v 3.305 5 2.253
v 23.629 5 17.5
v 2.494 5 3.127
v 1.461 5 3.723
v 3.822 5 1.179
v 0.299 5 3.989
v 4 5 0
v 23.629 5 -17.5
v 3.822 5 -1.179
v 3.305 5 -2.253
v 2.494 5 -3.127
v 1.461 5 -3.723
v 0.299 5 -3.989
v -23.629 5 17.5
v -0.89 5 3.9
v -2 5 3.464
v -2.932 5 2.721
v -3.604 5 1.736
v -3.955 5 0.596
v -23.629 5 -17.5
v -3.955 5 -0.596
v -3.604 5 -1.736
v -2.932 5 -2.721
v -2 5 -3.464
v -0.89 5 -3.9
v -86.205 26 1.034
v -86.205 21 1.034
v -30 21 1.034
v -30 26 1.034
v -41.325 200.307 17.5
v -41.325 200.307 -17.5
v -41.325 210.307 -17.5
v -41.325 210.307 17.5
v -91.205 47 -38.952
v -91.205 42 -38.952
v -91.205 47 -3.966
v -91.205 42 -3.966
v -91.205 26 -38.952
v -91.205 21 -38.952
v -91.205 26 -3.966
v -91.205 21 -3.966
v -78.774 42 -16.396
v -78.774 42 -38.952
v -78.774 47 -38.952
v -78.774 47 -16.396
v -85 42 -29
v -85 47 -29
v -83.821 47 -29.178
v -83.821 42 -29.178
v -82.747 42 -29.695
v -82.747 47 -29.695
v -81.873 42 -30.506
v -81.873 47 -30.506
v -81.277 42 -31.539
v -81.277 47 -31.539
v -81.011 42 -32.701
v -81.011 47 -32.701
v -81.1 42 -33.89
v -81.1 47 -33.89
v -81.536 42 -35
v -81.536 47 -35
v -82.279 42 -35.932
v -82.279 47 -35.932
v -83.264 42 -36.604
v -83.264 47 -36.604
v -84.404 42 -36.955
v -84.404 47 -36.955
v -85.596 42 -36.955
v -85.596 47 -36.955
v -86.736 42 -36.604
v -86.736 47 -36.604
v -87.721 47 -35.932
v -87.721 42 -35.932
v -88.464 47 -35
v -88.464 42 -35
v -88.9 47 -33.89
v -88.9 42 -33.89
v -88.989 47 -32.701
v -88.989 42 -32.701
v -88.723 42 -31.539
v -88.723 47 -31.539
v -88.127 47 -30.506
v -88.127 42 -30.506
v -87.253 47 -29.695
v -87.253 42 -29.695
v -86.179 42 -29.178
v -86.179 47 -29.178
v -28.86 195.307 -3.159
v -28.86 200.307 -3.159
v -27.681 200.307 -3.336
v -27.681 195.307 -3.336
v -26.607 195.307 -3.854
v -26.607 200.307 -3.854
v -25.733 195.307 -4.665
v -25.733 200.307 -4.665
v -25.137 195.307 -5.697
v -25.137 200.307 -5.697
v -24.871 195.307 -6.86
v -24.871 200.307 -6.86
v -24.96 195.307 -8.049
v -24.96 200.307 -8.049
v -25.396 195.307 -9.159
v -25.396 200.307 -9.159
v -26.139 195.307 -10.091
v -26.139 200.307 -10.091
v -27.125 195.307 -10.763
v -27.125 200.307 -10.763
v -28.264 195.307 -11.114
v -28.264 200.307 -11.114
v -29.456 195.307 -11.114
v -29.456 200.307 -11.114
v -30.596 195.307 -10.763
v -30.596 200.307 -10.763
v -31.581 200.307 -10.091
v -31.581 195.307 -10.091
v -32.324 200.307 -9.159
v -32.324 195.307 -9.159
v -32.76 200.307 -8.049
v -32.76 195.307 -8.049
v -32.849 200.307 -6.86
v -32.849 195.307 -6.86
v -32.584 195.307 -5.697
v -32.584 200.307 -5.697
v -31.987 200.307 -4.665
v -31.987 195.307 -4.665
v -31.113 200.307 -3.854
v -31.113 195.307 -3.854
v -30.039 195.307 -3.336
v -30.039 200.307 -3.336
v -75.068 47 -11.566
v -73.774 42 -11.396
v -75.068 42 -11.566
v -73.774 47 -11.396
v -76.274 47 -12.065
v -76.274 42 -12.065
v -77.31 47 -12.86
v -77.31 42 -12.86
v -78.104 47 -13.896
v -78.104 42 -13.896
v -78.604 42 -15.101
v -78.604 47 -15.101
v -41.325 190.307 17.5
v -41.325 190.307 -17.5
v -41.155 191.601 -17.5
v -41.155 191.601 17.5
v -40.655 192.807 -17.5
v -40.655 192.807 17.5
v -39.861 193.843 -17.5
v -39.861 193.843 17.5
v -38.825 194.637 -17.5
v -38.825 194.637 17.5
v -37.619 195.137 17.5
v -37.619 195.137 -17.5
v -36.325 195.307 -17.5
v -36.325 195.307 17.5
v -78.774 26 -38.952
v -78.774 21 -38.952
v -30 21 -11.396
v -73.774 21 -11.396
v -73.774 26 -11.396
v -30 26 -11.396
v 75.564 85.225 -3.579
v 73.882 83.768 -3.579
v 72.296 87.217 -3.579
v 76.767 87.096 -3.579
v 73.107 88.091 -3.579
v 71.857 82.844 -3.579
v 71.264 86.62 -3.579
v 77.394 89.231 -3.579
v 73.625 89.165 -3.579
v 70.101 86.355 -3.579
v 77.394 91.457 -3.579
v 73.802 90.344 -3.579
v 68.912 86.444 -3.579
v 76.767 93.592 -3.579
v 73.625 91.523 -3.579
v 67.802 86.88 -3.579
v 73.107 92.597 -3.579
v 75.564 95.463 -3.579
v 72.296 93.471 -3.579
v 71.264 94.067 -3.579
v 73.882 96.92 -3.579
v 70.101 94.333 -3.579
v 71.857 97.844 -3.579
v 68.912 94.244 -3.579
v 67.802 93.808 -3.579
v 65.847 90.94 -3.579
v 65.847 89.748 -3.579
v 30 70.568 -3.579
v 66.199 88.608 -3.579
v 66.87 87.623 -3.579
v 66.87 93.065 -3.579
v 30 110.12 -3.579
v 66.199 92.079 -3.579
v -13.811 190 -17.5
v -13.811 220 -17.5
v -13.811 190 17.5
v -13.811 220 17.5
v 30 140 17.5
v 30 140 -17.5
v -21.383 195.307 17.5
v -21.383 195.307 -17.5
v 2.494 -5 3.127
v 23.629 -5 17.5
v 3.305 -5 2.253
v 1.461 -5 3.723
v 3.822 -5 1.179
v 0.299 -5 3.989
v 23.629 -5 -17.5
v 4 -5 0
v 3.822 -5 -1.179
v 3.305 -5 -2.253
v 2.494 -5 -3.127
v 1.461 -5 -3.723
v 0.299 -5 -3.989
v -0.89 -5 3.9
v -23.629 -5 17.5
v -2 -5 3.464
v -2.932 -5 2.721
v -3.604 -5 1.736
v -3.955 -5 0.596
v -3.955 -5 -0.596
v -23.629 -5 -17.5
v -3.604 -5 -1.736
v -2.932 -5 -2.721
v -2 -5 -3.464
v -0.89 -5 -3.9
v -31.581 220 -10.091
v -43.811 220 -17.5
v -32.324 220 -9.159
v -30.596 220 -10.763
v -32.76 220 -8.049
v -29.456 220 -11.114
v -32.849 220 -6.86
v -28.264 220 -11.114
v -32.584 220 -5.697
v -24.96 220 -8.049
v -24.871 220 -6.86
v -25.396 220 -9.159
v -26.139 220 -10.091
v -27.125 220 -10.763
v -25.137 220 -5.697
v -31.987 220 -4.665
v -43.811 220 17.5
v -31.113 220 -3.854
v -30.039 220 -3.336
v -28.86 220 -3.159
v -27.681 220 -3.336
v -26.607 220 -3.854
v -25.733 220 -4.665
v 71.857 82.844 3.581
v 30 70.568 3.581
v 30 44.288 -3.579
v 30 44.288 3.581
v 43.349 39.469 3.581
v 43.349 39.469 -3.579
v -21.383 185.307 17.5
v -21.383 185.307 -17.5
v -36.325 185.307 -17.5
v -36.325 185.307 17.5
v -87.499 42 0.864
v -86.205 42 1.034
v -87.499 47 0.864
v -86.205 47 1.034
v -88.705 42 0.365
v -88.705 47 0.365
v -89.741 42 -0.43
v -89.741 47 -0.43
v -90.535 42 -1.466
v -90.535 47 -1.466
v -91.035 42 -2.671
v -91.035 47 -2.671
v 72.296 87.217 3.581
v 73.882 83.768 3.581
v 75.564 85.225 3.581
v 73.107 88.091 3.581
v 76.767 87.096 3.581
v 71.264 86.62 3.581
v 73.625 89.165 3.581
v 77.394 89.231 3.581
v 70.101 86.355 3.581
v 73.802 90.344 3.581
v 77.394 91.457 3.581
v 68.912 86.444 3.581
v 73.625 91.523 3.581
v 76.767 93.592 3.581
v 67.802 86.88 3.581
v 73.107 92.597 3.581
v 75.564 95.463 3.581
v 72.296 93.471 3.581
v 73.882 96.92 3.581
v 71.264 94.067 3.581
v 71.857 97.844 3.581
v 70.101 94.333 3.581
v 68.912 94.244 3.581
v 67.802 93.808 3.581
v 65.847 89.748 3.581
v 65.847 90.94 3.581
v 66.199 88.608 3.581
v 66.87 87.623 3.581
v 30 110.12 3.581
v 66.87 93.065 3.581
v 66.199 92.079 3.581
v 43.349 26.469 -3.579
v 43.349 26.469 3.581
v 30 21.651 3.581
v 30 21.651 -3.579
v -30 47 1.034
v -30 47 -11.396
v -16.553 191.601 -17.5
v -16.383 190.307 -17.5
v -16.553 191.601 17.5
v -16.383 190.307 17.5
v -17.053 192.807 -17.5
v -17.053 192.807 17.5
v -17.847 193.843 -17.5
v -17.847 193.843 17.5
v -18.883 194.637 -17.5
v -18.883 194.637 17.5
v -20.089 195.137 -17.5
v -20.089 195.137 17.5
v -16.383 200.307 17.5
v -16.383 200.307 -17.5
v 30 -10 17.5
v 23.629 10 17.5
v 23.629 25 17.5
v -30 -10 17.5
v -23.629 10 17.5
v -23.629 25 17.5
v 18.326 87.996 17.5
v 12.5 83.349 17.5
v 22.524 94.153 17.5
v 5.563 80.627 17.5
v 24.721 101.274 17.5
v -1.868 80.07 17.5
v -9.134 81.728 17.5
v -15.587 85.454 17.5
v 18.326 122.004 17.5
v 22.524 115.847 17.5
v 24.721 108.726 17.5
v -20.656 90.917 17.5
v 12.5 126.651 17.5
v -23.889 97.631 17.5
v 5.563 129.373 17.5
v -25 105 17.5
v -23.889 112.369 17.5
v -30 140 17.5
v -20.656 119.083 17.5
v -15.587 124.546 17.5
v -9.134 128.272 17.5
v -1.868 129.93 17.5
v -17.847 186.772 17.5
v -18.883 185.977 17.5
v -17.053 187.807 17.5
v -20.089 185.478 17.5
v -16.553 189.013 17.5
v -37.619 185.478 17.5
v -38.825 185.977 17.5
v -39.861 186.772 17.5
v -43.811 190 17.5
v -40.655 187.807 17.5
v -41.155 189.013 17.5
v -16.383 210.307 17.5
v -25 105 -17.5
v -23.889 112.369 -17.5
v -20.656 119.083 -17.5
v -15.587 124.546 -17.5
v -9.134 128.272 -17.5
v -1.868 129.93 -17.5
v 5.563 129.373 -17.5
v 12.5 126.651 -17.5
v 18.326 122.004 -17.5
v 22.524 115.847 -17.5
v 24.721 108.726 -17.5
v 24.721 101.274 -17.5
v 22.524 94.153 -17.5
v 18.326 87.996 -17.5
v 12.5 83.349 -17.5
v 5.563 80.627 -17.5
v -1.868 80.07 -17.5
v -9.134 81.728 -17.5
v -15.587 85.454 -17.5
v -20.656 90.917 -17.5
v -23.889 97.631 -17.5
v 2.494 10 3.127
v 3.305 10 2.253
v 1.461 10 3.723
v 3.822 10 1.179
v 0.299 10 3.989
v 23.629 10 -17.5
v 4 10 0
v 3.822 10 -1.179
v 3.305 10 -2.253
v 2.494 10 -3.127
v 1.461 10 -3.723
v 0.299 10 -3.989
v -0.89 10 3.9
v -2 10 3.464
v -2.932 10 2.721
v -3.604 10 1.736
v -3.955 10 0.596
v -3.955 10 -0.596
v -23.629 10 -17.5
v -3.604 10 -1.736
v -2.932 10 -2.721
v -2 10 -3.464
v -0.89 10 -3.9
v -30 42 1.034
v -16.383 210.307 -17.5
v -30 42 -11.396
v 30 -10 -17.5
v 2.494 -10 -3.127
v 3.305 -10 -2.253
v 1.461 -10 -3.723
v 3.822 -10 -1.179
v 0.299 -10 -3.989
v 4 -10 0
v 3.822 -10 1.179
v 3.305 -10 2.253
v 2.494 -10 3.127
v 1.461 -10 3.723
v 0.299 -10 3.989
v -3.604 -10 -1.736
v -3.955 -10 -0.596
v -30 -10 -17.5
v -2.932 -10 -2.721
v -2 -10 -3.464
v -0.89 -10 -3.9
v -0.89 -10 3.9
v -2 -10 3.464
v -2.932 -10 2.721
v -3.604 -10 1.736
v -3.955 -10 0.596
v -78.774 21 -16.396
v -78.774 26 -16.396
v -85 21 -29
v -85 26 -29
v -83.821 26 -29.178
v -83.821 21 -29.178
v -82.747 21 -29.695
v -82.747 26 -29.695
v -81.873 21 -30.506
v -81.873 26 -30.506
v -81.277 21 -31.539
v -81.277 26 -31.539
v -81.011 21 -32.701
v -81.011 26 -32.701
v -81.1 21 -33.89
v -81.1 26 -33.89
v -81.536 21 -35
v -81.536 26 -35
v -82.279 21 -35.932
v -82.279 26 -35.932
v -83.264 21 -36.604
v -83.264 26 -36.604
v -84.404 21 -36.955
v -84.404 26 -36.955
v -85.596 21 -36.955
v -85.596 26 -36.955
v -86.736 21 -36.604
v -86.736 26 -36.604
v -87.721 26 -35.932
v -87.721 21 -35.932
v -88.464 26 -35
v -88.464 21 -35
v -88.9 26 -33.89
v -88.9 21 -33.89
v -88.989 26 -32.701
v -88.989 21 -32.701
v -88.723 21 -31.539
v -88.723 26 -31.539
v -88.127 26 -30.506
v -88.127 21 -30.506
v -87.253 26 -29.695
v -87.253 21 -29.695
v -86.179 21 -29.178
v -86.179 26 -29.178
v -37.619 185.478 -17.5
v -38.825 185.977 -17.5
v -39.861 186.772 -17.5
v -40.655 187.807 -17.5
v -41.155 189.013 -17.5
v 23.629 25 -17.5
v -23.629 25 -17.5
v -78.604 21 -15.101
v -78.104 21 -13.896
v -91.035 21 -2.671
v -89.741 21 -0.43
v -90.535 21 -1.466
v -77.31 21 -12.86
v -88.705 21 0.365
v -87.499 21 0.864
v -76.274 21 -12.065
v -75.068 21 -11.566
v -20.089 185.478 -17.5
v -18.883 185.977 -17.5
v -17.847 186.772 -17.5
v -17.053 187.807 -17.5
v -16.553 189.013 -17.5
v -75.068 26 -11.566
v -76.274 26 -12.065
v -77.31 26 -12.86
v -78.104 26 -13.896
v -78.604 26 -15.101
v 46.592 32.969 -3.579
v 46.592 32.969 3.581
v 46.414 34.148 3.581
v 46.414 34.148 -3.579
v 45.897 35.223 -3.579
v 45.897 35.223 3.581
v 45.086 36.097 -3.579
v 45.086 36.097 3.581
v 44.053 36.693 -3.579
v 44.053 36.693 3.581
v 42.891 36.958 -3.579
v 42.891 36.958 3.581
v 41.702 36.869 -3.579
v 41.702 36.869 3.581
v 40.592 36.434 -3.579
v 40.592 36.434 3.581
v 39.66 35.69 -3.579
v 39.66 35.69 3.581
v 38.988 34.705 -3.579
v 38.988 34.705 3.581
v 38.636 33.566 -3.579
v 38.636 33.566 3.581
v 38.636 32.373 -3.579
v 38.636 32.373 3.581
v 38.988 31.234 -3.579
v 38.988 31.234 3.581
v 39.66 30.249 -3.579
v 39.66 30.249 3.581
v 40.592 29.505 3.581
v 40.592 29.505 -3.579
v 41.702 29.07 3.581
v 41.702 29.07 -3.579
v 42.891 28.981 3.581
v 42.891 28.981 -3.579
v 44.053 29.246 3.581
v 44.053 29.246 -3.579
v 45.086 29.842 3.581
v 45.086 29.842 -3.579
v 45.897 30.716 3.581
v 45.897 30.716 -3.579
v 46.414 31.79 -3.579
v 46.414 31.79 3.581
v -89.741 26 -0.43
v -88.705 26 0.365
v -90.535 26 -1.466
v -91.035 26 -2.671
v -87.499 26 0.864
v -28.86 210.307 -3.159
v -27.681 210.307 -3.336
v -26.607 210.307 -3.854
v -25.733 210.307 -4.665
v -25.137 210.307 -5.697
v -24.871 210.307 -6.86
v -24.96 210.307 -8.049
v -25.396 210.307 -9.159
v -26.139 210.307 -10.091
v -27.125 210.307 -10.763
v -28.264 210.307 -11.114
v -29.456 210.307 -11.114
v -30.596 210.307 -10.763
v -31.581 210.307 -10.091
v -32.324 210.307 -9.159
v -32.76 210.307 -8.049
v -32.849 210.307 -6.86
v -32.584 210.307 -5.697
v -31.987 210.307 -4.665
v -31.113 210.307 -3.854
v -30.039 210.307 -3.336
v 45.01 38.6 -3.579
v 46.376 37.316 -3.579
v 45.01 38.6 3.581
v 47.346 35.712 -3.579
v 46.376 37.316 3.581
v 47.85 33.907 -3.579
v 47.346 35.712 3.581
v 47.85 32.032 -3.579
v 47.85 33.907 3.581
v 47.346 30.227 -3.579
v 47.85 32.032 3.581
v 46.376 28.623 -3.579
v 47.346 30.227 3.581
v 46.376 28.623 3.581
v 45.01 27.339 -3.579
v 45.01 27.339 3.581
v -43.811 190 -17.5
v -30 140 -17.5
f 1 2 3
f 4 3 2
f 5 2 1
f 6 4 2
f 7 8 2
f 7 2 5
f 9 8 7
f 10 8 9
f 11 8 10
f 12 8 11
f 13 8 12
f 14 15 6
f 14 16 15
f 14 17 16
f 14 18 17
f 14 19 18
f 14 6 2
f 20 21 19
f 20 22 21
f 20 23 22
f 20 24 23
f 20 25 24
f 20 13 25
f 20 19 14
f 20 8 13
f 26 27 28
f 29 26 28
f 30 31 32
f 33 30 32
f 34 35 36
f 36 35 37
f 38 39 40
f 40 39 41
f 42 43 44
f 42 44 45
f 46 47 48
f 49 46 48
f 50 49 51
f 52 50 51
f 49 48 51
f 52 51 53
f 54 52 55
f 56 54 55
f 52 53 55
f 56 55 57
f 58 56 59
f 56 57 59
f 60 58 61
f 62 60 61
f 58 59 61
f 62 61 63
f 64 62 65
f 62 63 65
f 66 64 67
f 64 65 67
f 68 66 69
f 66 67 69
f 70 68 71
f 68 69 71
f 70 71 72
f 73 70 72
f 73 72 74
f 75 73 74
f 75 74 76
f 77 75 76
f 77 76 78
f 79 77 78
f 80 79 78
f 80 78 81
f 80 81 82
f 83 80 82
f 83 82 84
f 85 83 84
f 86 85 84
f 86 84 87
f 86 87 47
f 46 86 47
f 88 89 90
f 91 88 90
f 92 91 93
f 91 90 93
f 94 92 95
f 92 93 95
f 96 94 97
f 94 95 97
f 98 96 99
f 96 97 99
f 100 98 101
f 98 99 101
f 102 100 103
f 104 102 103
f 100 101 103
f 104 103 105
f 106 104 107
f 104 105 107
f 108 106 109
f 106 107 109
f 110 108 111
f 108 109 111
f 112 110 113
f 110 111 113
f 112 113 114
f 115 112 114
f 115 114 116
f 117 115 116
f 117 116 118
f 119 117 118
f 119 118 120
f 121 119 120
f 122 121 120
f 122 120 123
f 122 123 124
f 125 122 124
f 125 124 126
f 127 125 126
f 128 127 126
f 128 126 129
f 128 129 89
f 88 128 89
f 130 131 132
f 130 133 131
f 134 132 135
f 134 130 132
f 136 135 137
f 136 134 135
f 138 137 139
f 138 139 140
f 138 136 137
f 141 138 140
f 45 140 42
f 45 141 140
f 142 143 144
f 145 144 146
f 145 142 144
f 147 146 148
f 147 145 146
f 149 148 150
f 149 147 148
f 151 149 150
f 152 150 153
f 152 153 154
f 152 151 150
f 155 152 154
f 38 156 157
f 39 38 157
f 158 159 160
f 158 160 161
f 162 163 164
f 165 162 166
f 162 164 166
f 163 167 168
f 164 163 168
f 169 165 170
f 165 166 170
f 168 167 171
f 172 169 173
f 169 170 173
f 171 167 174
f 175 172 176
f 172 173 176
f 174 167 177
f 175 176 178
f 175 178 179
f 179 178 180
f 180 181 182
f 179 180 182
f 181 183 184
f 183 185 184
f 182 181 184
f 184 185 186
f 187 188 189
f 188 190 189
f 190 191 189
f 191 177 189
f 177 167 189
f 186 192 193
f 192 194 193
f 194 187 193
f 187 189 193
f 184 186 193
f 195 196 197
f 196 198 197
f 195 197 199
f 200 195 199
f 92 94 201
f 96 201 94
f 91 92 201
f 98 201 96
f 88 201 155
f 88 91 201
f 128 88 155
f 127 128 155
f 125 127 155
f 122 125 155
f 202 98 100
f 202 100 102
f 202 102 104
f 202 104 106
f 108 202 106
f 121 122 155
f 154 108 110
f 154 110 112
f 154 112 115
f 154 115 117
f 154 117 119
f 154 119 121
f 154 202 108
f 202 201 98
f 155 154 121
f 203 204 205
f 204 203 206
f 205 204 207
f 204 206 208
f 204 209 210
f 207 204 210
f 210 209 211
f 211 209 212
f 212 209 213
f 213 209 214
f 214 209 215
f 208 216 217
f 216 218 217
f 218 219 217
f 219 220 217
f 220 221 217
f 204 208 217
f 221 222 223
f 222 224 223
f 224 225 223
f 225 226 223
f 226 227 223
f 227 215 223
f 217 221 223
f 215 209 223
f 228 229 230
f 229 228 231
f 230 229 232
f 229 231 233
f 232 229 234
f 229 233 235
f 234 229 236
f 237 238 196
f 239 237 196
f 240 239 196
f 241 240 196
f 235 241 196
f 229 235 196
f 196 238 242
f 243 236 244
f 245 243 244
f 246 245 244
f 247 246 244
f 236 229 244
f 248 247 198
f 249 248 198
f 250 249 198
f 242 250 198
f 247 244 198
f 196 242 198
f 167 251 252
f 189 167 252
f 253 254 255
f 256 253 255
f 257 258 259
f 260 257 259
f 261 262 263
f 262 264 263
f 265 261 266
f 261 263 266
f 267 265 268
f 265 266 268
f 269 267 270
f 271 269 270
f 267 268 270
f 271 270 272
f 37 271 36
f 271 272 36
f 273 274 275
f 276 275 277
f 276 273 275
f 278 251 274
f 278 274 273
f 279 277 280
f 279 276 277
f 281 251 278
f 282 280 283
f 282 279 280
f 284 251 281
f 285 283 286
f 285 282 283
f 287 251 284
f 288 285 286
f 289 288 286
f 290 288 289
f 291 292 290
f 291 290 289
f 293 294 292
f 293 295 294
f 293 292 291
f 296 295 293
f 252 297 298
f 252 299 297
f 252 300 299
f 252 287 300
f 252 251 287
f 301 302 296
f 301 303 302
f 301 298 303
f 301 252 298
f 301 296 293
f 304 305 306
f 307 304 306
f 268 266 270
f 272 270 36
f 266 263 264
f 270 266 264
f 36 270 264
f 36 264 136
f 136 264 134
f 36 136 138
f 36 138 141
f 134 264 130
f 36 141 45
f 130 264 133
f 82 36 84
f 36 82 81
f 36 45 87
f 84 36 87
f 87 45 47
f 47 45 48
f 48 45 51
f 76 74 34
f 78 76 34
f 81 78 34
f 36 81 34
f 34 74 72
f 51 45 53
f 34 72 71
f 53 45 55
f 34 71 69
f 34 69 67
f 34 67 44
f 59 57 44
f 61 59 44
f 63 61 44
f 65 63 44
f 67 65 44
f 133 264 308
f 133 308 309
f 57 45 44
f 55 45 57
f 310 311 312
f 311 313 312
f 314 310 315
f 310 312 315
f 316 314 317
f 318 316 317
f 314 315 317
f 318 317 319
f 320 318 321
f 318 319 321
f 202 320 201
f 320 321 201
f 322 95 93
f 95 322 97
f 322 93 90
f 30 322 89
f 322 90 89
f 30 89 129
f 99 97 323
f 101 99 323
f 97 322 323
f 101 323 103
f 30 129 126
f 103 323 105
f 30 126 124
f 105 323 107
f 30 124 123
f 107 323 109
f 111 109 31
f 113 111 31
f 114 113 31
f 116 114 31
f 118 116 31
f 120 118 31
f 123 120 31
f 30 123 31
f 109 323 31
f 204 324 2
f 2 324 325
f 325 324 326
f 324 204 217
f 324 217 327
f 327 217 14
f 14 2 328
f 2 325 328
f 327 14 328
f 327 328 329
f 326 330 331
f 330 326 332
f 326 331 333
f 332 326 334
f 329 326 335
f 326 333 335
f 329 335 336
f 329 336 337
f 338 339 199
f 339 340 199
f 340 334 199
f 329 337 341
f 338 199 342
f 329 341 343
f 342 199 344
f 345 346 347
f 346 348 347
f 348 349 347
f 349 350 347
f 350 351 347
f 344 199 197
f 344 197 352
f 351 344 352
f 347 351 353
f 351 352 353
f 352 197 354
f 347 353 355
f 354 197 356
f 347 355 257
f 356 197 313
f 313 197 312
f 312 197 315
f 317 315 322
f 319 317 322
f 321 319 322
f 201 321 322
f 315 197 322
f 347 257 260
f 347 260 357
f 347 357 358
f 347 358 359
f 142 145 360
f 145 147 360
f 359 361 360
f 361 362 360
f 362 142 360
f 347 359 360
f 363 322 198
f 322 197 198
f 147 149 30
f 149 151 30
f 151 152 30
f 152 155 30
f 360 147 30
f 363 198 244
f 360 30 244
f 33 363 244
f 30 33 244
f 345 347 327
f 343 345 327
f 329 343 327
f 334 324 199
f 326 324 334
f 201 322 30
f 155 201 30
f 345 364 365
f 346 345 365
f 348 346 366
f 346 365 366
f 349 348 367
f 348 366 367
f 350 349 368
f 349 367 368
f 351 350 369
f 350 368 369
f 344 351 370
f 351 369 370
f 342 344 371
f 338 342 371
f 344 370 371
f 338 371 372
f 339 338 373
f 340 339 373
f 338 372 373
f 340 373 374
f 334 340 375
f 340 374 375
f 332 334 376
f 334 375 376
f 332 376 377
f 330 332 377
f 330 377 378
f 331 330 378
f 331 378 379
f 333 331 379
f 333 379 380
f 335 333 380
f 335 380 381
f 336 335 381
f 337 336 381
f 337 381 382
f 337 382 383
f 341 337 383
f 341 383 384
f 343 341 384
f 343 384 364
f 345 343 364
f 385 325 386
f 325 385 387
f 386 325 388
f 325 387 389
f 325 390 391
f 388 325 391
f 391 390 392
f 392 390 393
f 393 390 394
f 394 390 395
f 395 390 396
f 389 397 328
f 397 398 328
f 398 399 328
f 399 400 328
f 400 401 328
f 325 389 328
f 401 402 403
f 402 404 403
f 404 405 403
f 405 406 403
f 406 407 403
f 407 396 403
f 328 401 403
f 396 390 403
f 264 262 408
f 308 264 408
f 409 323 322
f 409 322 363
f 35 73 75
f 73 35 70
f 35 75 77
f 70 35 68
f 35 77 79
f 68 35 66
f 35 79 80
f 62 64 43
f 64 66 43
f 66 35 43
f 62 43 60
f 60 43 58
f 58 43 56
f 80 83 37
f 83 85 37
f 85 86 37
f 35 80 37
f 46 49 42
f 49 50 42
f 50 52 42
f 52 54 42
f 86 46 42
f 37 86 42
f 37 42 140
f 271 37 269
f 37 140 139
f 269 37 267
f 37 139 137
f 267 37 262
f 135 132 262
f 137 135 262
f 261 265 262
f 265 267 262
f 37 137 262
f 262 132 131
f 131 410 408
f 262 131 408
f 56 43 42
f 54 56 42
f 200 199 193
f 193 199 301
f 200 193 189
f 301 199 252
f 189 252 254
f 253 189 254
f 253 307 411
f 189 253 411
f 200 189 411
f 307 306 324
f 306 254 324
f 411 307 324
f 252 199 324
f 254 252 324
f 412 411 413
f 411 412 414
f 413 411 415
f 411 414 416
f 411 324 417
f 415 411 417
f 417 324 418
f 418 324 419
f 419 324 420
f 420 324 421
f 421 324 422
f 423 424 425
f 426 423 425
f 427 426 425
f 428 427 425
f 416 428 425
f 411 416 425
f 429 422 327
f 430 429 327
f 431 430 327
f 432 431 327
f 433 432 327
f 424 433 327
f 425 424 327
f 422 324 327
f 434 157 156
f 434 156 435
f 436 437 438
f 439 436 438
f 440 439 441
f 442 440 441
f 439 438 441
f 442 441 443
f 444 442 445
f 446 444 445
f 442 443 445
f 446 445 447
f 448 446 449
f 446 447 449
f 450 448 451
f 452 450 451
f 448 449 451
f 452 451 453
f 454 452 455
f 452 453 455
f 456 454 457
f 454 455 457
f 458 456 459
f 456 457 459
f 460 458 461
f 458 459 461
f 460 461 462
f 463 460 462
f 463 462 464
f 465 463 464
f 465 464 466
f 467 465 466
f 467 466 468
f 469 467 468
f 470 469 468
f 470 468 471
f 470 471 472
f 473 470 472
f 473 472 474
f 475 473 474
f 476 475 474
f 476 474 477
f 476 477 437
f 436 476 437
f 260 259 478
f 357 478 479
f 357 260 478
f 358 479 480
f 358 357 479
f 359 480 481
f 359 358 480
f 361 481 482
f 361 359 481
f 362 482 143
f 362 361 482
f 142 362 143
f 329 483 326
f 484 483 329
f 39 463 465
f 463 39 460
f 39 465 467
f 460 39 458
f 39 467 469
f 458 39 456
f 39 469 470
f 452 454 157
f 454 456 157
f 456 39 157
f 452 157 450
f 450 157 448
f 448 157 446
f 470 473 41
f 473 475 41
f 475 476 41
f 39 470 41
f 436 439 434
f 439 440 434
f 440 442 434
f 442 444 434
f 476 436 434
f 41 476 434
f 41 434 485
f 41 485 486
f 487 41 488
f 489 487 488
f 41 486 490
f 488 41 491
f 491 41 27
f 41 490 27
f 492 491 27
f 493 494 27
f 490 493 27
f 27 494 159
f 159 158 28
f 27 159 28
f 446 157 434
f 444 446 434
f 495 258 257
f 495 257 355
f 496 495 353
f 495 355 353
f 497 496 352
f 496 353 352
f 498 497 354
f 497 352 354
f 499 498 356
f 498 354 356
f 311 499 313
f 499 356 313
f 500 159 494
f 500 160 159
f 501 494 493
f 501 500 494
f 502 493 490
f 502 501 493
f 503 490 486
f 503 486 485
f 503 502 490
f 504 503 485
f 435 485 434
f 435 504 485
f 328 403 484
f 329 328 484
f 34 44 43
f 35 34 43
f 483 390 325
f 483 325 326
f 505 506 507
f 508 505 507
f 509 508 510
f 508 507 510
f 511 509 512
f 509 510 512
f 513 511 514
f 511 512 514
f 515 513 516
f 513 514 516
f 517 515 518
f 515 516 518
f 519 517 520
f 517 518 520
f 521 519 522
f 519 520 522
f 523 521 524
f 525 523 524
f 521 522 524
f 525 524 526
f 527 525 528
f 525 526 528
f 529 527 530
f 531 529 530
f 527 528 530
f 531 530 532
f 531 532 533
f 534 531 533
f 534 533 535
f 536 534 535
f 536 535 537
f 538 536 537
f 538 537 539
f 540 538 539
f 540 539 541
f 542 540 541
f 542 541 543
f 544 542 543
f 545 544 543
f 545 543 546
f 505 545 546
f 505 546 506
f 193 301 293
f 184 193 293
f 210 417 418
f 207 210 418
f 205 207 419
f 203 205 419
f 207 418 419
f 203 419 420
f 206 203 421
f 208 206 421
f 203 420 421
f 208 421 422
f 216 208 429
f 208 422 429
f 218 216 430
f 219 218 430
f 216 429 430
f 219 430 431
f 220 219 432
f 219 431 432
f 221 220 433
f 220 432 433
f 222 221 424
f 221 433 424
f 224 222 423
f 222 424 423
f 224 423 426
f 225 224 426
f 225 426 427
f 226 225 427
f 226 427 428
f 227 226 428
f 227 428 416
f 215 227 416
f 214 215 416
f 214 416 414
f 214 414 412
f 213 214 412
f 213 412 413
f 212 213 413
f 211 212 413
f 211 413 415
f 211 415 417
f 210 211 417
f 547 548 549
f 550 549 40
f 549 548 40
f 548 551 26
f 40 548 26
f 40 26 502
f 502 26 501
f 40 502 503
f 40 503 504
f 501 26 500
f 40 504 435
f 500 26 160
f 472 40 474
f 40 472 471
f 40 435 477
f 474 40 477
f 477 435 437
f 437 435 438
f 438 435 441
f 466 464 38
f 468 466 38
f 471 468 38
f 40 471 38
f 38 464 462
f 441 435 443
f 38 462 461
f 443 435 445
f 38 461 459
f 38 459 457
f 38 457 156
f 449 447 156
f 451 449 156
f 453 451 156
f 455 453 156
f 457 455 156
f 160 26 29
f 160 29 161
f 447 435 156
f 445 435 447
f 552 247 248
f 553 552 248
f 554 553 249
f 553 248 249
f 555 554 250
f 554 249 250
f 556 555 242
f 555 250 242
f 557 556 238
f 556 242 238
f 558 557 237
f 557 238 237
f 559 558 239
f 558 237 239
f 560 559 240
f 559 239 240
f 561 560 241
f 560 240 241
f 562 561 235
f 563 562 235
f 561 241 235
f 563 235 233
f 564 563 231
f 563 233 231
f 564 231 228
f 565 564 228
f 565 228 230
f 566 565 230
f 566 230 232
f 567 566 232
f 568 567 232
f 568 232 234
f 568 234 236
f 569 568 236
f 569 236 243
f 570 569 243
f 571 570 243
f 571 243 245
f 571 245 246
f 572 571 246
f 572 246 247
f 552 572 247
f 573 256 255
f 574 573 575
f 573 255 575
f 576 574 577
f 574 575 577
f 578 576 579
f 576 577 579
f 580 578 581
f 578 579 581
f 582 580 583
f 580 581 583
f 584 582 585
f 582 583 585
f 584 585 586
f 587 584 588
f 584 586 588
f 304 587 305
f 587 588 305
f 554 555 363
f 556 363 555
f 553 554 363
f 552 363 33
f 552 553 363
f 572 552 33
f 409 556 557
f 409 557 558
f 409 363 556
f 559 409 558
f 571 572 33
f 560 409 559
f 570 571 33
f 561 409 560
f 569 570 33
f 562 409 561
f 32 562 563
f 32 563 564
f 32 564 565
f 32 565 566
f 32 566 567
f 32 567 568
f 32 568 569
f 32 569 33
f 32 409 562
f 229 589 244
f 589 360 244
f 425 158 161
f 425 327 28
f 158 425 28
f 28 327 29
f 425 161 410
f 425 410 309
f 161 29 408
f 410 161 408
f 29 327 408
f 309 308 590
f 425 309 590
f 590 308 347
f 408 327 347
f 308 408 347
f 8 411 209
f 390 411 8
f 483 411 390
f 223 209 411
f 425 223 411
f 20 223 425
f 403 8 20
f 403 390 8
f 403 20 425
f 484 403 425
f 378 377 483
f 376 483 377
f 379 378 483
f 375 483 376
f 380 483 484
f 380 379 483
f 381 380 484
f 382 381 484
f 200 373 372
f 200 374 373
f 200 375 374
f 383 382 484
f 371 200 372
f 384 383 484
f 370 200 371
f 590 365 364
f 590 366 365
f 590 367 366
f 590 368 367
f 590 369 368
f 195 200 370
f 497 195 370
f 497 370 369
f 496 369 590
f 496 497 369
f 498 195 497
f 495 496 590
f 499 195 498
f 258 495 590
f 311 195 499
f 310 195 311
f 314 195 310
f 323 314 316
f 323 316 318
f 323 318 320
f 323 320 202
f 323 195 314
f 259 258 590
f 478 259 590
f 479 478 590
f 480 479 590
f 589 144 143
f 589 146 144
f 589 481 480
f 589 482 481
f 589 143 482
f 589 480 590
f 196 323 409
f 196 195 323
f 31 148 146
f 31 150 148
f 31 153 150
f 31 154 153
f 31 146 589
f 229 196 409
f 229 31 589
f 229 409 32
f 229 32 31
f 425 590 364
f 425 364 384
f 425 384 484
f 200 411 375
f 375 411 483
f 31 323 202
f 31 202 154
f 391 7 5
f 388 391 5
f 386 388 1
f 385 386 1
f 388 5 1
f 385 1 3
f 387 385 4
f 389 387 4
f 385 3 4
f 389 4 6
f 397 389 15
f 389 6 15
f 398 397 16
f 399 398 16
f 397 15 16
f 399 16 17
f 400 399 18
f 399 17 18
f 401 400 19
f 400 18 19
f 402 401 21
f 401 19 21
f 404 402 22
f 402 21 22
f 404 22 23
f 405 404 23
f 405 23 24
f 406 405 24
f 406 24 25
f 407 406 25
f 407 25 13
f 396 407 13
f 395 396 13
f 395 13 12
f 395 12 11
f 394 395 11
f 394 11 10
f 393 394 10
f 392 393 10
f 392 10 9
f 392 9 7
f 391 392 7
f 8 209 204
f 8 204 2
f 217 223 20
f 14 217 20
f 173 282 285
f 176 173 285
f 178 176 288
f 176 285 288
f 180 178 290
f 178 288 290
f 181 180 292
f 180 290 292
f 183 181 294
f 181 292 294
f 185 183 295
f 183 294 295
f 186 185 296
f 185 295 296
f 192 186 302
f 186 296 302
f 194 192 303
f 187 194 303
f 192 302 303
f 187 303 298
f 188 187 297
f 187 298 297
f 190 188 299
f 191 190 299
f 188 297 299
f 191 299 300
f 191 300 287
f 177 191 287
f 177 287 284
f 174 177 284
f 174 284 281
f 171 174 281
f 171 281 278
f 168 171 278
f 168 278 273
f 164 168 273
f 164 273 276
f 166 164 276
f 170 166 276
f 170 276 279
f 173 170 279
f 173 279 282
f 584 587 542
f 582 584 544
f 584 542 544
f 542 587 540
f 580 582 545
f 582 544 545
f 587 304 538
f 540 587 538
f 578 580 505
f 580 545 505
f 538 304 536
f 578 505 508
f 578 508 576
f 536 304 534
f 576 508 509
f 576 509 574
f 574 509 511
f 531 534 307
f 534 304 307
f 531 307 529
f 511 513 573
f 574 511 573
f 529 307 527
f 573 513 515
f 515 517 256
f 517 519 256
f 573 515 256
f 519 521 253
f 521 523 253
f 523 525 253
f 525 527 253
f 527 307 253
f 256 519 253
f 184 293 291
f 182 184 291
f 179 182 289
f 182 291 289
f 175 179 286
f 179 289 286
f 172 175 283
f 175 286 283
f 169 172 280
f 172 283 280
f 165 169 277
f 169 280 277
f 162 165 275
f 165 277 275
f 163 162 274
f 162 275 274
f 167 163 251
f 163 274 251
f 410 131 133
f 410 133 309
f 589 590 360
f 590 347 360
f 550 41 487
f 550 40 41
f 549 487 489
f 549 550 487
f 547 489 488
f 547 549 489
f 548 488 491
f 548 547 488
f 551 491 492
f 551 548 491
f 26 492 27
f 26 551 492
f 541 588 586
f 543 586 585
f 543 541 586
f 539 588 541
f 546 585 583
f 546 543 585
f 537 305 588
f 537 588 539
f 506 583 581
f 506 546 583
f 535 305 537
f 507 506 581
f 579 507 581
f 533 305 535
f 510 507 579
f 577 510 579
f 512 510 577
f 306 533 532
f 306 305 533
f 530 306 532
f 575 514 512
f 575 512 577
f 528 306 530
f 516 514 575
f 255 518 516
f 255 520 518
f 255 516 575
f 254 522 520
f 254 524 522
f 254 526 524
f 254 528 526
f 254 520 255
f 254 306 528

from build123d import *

# Parameters (mm, degrees)
BOSS_EXTRUDE1_DEPTH = 17.5
SKETCH6_W           = 24.942027916
SKETCH6_H           = 10
SKETCH6_W_2         = 47.258134024
SKETCH6_H_2         = 15
CUT_EXTRUDE1_DEPTH  = 228.033901494
SKETCH7_R           = 25
CUT_EXTRUDE2_DEPTH  = 228.033901494
SKETCH8_R           = 4
CUT_EXTRUDE3_DEPTH  = 30
SKETCH10_R          = 4
CUT_EXTRUDE4_DEPTH  = 30
SKETCH11_W          = 7.160304618
SKETCH11_H          = 39.552070702
SKETCH11_H_2        = 22.637315958
BOSS_EXTRUDE2_DEPTH = 50
SKETCH13_R          = 4
CUT_EXTRUDE5_DEPTH  = 50
CUT_EXTRUDE6_DEPTH  = 50
CUT_EXTRUDE7_DEPTH  = 50
BOSS_EXTRUDE3_DEPTH = 70
SKETCH19_R          = 4
CUT_EXTRUDE8_DEPTH  = 70
SKETCH20_W          = 48.774167315
SKETCH20_H          = 27.556784468
CUT_EXTRUDE9_DEPTH  = 70
CUT_EXTRUDE10_DEPTH = 70
FILLET1_R           = 5
FILLET2_R           = 5
FILLET3_R           = 5
FILLET4_R           = 5


with BuildPart() as part:
    # Sketch1 → Boss-Extrude1 (new, symmetric)
    with BuildSketch(Plane.XY):
        Polygon((30, -10), (-30, -10), (-30, 140), (-43.810871114, 190), (-43.810871114, 220), (-13.810871114, 220), (-13.810871114, 190), (30, 140), align=None)
    extrude(amount=BOSS_EXTRUDE1_DEPTH, both=True)

    # Sketch6 → Cut-Extrude1 (cut, through all)
    with BuildSketch(Plane(origin=(0, 0, -17.5), x_dir=(-1, 0, 0), z_dir=(0, 0, -1))):
        with Locations((28.85405418, 190.307263481)):
            Rectangle(SKETCH6_W, SKETCH6_H)
        Rectangle(SKETCH6_W_2, SKETCH6_H)
        with Locations((0, 17.5)):
            Rectangle(SKETCH6_W_2, SKETCH6_H_2)
        with Locations((28.85405418, 205.307263481)):
            Rectangle(SKETCH6_W, SKETCH6_H)
    extrude(amount=-CUT_EXTRUDE1_DEPTH, mode=Mode.SUBTRACT)

    # Sketch7 → Cut-Extrude2 (cut, through all)
    with BuildSketch(Plane(origin=(0, 0, -17.5), x_dir=(-1, 0, 0), z_dir=(0, 0, -1))):
        with Locations((0, 105)):
            Circle(SKETCH7_R)
    extrude(amount=-CUT_EXTRUDE2_DEPTH, mode=Mode.SUBTRACT)

    # Sketch8 → Cut-Extrude3 (cut)
    with BuildSketch(Plane(origin=(0, 220, 0), x_dir=(1, 0, 0), z_dir=(0, 1, 0))):
        with Locations(Location((-28.860081831, 7.158757746, 0), (0, 0, 270))):
            Circle(SKETCH8_R)
    extrude(amount=-CUT_EXTRUDE3_DEPTH, mode=Mode.SUBTRACT)

    # Sketch10 → Cut-Extrude4 (cut)
    with BuildSketch(Plane.XZ.offset(10)):
        Circle(SKETCH10_R)
    extrude(amount=-CUT_EXTRUDE4_DEPTH, mode=Mode.SUBTRACT)

    # Sketch11 → Boss-Extrude2 (add)
    with BuildSketch(Plane(origin=(30, 0, 0), x_dir=(0, 0, -1), z_dir=(1, 0, 0))):
        with Locations((-0.000773436, 90.343921661)):
            Rectangle(SKETCH11_W, SKETCH11_H)
        with Locations((-0.000773436, 32.969473472)):
            Rectangle(SKETCH11_W, SKETCH11_H_2)
    extrude(amount=BOSS_EXTRUDE2_DEPTH)

    # Sketch13 → Cut-Extrude5 (cut)
    with BuildSketch(Plane.XY.offset(3.580925745)):
        with Locations((69.802457577, 90.343921661)):
            Circle(SKETCH13_R)
        with Locations((42.591748381, 32.969473472)):
            Circle(SKETCH13_R)
    extrude(amount=-CUT_EXTRUDE5_DEPTH, mode=Mode.SUBTRACT)

    # Sketch14 → Cut-Extrude6 (cut)
    with BuildSketch(Plane.XY.offset(3.580925745)):
        with BuildLine():
            Line((30, 110.119957012), (71.857382865, 97.843921661))
            ThreePointArc((71.857382865, 97.843921661), (77.47366635, 90.343921661), (71.857382865, 82.843921661))
            Line((71.857382865, 82.843921661), (30, 70.56788631))
            Line((30, 70.56788631), (80, 70.56788631))
            Line((80, 70.56788631), (80, 110.119957012))
            Line((80, 110.119957012), (30, 110.119957012))
        make_face()
    extrude(amount=-CUT_EXTRUDE6_DEPTH, mode=Mode.SUBTRACT)

    # Sketch15 → Cut-Extrude7 (cut)
    with BuildSketch(Plane.XY.offset(3.580925745)):
        with BuildLine():
            Line((30, 44.288131451), (43.349487429, 39.469473472))
            ThreePointArc((43.349487429, 39.469473472), (47.913726584, 32.969473472), (43.349487429, 26.469473472))
            Line((43.349487429, 26.469473472), (30, 21.650815493))
            Line((30, 21.650815493), (80, 21.650815493))
            Line((80, 21.650815493), (80, 44.288131451))
            Line((80, 44.288131451), (30, 44.288131451))
        make_face()
    extrude(amount=-CUT_EXTRUDE7_DEPTH, mode=Mode.SUBTRACT)

    # Sketch18 → Boss-Extrude3 (add)
    with BuildSketch(Plane.ZY.offset(30)):
        Polygon((11.672732765, 47), (-11.672732765, 47), (-38.952313989, 47), (-38.952313989, 42), (-11.672732765, 42), (11.672732765, 42), align=None)
        Polygon((-11.672732765, 26), (-38.952313989, 26), (-38.952313989, 21), (-11.672732765, 21), (11.672732765, 21), (11.672732765, 26), align=None)
    extrude(amount=BOSS_EXTRUDE3_DEPTH)

    # Sketch19 → Cut-Extrude8 (cut)
    with BuildSketch(Plane(origin=(0, 47, 0), x_dir=(1, 0, 0), z_dir=(0, 1, 0))):
        with Locations(Location((-85, 33, 0), (0, 0, 270))):
            Circle(SKETCH19_R)
    extrude(amount=-CUT_EXTRUDE8_DEPTH, mode=Mode.SUBTRACT)

    # Sketch20 → Cut-Extrude9 (cut)
    with BuildSketch(Plane.XZ.offset(-21)):
        with Locations((-54.387083657, -25.173921755)):
            Rectangle(SKETCH20_W, SKETCH20_H)
    extrude(amount=-CUT_EXTRUDE9_DEPTH, mode=Mode.SUBTRACT)

    # Sketch22 → Cut-Extrude10 (cut)
    with BuildSketch(Plane.XZ.offset(-21)):
        Polygon((-91.205371371, -38.952313989), (-91.205371371, 1.034470479), (-30, 1.034470479), (-30, 11.672732765), (-100, 11.672732765), (-100, -38.952313989), align=None)
    extrude(amount=-CUT_EXTRUDE10_DEPTH, mode=Mode.SUBTRACT)

    # Fillet1
    fillet1_edges = [part.edges().sort_by_distance(p)[0] for p in [
        (-78.774167315, 44.5, -11.395529521),
    ]]
    fillet(fillet1_edges, radius=FILLET1_R)

    # Fillet2
    fillet2_edges = [part.edges().sort_by_distance(p)[0] for p in [
        (-78.774167315, 23.5, -11.395529521),
    ]]
    fillet(fillet2_edges, radius=FILLET2_R)

    # Fillet3
    fillet3_edges = [part.edges().sort_by_distance(p)[0] for p in [
        (-91.205371371, 44.5, 1.034470479),
        (-91.205371371, 23.5, 1.034470479),
    ]]
    fillet(fillet3_edges, radius=FILLET3_R)

    # Fillet4
    fillet4_edges = [part.edges().sort_by_distance(p)[0] for p in [
        (-41.325068138, 185.307263481, 0),
        (-16.383040222, 185.307263481, 0),
        (-16.383040222, 195.307263481, 0),
        (-41.325068138, 195.307263481, 0),
    ]]
    fillet(fillet4_edges, radius=FILLET4_R - 0.0001)  # a hair under: the kernel refuses the full size


solid = part.part
